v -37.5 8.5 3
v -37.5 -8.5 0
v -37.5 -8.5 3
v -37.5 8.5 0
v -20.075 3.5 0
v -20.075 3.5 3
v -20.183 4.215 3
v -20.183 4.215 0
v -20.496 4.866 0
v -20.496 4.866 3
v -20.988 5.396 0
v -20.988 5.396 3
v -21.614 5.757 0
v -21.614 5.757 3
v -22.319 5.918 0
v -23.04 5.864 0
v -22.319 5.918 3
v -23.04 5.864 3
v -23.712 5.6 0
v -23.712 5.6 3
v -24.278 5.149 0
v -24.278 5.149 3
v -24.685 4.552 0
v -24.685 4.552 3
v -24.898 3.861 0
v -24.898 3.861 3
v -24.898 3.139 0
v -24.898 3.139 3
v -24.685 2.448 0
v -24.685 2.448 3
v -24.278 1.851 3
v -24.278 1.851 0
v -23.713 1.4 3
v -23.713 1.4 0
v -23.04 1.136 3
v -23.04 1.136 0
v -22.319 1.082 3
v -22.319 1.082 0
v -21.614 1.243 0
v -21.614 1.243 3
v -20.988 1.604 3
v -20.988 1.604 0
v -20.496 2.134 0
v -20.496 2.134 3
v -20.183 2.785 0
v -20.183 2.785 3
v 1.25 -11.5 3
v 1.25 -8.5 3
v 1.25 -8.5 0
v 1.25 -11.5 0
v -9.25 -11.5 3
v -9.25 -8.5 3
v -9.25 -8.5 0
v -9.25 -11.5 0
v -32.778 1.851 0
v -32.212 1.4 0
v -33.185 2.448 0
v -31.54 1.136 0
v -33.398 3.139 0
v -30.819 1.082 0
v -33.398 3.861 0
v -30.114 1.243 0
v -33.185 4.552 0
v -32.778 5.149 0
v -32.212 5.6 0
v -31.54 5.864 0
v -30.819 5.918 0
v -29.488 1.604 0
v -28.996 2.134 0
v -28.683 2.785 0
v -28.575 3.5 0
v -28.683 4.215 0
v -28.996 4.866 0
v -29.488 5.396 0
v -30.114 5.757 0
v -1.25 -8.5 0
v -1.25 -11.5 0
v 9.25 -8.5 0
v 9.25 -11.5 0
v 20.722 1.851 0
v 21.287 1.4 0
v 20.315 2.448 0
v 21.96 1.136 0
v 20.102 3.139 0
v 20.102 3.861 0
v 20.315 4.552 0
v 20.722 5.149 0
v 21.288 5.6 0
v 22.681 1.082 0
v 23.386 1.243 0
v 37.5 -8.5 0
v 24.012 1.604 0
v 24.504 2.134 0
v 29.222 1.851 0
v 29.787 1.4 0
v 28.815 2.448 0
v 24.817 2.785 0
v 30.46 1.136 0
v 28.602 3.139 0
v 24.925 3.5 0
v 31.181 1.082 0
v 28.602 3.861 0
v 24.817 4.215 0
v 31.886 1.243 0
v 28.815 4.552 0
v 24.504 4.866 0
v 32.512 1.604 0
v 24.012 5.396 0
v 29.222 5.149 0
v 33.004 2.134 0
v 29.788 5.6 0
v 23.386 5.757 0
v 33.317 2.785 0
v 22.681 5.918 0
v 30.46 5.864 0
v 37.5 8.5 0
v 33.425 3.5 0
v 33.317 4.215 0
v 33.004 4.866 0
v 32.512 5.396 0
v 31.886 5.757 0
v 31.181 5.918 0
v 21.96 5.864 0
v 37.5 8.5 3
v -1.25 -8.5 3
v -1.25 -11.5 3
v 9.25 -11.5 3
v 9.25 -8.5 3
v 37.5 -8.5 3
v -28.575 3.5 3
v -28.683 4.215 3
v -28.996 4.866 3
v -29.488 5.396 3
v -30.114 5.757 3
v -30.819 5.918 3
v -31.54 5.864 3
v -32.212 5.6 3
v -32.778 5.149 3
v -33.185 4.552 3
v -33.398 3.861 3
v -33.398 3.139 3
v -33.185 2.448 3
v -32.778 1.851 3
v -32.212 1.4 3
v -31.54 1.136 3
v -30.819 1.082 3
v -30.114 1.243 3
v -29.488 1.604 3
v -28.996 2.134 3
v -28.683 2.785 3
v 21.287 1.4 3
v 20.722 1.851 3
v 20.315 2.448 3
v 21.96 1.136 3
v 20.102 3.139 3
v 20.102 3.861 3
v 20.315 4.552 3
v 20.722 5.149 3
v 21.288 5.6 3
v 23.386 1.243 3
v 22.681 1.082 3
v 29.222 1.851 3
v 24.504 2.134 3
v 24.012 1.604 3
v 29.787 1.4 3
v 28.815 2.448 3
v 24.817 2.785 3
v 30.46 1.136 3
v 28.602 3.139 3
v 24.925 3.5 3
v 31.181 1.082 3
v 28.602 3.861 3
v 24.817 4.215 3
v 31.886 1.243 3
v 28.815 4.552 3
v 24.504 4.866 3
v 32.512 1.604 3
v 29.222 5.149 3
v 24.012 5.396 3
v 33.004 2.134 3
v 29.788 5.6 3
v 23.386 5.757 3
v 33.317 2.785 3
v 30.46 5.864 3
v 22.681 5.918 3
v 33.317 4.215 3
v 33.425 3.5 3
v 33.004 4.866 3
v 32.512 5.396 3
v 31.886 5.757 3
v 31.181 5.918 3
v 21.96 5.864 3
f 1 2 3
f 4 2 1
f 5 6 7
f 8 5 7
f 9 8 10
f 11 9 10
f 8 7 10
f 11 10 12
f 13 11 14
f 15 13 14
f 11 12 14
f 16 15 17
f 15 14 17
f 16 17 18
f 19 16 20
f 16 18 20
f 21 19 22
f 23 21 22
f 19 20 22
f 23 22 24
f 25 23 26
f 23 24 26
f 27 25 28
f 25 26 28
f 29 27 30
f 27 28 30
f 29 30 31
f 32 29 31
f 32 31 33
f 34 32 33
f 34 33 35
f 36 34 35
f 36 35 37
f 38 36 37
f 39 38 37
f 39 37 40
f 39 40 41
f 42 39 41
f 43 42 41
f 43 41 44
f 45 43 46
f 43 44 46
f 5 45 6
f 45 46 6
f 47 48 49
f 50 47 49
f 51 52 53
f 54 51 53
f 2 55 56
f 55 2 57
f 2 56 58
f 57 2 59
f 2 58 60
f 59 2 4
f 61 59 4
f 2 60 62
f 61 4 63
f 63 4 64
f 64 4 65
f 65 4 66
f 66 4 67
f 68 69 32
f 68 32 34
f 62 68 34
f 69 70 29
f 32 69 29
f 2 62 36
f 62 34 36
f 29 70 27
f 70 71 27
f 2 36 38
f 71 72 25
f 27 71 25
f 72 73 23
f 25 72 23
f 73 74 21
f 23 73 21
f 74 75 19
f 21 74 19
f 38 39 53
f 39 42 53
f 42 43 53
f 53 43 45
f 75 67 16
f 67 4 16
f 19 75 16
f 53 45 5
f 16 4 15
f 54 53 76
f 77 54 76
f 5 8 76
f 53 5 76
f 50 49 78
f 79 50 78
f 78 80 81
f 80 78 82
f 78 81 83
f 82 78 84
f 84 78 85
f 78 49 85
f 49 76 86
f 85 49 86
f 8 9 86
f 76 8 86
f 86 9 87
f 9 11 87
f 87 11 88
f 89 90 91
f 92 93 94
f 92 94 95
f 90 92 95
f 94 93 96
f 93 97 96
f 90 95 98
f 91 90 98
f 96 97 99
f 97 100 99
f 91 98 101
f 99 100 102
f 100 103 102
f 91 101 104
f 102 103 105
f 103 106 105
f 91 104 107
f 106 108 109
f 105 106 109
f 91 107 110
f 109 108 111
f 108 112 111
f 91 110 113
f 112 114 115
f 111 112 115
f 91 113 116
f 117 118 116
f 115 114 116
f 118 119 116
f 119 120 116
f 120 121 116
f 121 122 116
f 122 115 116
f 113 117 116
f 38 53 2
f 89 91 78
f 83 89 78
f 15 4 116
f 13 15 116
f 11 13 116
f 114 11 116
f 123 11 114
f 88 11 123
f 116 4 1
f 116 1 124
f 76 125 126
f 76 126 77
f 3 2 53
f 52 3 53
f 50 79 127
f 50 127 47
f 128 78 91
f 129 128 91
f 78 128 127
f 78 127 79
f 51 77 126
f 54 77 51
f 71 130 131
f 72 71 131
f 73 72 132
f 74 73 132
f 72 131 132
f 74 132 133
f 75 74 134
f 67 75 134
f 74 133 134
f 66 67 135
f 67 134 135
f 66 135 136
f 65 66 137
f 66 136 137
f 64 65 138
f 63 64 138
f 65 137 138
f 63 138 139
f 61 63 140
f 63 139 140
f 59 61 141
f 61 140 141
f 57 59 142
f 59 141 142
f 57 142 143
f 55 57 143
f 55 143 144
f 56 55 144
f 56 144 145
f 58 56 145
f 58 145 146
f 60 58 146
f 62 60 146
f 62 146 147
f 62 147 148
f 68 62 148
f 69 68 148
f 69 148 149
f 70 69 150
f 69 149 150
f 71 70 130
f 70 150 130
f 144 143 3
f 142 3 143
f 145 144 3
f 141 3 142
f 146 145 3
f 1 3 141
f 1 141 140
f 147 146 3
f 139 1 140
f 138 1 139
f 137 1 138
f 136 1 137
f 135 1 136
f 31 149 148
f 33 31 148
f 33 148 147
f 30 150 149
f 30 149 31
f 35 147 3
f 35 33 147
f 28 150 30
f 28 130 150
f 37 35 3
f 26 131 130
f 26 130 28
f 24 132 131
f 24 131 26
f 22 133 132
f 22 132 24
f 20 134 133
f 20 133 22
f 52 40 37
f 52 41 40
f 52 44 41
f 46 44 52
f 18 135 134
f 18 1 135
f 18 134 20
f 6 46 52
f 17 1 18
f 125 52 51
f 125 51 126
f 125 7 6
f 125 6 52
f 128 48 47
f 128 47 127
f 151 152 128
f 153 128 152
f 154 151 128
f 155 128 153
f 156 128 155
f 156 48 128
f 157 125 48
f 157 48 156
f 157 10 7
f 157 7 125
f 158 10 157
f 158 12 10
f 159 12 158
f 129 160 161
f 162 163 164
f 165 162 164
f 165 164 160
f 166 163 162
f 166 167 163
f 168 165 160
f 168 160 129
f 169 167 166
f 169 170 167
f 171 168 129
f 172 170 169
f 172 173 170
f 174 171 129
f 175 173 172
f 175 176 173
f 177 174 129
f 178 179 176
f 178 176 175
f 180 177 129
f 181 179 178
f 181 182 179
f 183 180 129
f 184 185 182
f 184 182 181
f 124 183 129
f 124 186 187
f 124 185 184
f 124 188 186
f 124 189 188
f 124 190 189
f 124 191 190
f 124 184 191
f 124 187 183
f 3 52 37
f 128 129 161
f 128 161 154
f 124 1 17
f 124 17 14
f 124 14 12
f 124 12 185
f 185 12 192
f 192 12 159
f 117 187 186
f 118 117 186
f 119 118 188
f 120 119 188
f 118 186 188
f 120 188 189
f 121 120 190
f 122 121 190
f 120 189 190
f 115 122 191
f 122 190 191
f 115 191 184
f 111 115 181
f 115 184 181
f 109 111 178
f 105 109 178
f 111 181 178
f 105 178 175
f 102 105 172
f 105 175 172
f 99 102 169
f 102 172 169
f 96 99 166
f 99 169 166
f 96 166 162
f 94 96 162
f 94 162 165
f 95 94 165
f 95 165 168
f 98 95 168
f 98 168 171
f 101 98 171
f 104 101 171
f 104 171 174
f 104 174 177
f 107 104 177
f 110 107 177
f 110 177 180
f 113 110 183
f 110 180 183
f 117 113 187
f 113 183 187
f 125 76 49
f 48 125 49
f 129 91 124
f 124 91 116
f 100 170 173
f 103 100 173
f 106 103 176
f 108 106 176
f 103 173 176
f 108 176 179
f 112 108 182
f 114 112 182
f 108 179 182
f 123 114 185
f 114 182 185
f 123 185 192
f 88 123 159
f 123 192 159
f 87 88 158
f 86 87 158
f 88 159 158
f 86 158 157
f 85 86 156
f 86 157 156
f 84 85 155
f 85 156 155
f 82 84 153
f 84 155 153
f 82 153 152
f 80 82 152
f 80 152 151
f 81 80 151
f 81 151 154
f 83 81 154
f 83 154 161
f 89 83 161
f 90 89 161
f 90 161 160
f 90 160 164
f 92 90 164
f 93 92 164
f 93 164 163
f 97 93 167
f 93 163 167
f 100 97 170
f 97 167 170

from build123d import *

# Parameters (mm, degrees)
SKETCH1_W           = 75
SKETCH1_H           = 17
BOSS_EXTRUDE1_DEPTH = 3
SKETCH2_W           = 8
SKETCH2_H           = 3
BOSS_EXTRUDE2_DEPTH = 3
SKETCH3_R           = 2.425
CUT_EXTRUDE1_DEPTH  = 3


with BuildPart() as part:
    # Sketch1 → Boss-Extrude1 (new body)
    with BuildSketch(Plane.XY):
        Rectangle(SKETCH1_W, SKETCH1_H)
    extrude(amount=BOSS_EXTRUDE1_DEPTH)

    # Sketch2 → Boss-Extrude2 (add)
    with BuildSketch(Plane(origin=(0, -8.5, 0), x_dir=(-1, 0, 0), z_dir=(0, -1, 0))):
        with Locations((5.25, -1.5)):
            Rectangle(SKETCH2_W, SKETCH2_H)
        with Locations((-5.25, -1.5)):
            Rectangle(SKETCH2_W, SKETCH2_H)
    extrude(amount=BOSS_EXTRUDE2_DEPTH)

    # Sketch3 → Cut-Extrude1 (cut)
    with BuildSketch(Plane.XY.offset(3)):
        with Locations((-31, 3.5)):
            Circle(SKETCH3_R)
        with Locations((-22.5, 3.5)):
            Circle(SKETCH3_R)
        with Locations((22.5, 3.5)):
            Circle(SKETCH3_R)
        with Locations((31, 3.5)):
            Circle(SKETCH3_R)
    extrude(amount=-CUT_EXTRUDE1_DEPTH, mode=Mode.SUBTRACT)


solid = part.part
